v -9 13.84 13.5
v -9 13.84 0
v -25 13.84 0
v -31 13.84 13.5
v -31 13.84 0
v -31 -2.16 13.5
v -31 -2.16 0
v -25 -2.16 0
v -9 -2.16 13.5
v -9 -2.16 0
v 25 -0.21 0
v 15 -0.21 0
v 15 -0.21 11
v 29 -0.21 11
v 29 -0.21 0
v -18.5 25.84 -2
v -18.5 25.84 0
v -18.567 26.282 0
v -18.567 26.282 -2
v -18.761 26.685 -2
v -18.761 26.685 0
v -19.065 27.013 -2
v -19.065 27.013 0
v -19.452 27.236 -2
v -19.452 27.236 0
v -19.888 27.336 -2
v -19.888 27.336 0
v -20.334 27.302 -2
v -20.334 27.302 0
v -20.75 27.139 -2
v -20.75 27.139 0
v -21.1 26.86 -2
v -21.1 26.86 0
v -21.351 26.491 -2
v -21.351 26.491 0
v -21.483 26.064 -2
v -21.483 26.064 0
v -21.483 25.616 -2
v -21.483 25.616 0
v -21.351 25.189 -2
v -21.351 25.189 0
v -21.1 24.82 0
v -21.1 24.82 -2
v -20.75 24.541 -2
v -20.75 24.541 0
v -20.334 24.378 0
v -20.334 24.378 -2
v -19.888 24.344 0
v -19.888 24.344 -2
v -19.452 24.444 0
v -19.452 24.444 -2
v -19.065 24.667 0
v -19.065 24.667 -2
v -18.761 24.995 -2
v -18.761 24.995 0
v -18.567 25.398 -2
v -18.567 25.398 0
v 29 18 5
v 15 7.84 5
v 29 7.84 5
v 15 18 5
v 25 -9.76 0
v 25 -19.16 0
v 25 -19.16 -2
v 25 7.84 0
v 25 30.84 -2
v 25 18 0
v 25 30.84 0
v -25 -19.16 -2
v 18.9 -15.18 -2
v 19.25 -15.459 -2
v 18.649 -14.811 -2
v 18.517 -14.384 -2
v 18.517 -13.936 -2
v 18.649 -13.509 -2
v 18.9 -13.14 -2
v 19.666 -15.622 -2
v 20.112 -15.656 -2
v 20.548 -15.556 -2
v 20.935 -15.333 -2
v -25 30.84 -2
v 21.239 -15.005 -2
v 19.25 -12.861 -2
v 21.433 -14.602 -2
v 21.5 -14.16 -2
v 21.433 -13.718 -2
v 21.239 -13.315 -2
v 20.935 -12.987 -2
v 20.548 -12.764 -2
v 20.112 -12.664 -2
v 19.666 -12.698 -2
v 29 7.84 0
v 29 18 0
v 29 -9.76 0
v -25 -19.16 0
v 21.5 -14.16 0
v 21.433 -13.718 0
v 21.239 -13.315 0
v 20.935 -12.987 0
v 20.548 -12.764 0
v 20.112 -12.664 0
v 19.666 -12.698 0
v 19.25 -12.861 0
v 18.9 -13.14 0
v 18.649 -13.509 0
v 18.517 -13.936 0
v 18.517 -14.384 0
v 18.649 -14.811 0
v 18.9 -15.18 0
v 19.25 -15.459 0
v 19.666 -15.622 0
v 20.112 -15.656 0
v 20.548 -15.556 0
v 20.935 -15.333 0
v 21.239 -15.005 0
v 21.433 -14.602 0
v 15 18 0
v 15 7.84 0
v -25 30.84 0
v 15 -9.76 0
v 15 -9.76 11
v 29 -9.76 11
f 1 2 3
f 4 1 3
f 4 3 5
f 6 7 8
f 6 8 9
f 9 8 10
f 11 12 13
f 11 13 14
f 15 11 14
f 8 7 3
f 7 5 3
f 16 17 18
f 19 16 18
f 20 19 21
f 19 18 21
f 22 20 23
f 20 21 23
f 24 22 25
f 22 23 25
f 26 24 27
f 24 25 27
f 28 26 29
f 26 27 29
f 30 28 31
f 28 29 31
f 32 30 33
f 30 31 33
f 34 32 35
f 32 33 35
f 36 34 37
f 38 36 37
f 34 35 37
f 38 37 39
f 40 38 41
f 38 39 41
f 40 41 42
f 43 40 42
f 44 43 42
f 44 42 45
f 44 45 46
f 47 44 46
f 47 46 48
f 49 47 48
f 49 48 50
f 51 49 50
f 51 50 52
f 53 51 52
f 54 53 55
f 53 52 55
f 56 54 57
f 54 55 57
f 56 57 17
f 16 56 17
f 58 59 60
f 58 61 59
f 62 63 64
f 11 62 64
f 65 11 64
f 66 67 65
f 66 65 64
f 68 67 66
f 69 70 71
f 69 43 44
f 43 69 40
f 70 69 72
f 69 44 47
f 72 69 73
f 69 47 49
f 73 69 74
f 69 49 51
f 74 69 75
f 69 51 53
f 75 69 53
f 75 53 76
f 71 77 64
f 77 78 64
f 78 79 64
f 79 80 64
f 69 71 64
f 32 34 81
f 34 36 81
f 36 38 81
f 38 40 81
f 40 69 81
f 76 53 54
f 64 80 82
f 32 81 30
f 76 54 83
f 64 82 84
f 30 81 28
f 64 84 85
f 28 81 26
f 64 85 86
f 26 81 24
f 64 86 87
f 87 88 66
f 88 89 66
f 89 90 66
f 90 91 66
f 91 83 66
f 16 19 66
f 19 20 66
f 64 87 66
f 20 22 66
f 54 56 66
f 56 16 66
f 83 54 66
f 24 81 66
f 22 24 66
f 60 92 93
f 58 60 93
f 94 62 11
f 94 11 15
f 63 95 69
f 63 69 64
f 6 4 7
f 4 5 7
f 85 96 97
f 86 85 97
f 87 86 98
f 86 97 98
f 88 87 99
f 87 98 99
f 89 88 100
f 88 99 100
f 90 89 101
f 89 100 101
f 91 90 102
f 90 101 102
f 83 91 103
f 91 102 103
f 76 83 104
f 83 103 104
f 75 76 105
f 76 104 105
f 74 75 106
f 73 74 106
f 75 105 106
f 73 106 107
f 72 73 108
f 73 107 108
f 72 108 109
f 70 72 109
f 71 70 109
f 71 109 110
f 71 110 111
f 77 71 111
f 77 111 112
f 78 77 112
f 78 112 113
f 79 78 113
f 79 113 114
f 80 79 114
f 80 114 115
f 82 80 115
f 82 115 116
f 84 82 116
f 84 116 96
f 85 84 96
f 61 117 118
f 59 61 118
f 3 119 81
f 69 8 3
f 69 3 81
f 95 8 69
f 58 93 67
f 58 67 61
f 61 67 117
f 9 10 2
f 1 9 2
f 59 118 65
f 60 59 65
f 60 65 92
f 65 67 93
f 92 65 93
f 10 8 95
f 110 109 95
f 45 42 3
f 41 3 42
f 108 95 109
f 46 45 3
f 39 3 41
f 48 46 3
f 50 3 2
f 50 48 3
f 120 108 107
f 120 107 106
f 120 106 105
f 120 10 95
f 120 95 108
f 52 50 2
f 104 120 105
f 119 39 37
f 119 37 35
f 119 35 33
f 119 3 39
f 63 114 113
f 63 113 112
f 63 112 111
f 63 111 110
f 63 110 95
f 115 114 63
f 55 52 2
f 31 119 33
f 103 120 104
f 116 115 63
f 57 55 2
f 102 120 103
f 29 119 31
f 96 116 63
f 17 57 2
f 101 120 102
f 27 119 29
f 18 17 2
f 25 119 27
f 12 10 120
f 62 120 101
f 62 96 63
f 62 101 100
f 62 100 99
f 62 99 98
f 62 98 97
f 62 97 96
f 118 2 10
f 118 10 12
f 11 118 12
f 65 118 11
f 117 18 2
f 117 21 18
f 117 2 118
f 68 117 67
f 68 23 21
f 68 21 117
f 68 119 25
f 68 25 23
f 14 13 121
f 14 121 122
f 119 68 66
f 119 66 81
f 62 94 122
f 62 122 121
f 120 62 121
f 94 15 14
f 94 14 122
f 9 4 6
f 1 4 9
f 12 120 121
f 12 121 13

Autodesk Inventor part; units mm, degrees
ref_plane "YZ Plane" through (0, 0, 0) normal (1, 0, 0) x (0, 1, 0)
ref_plane "XZ Plane" through (0, 0, 0) normal (0, 1, 0) x (-1, 0, 0)
ref_plane "XY Plane" through (0, 0, 0) normal (0, 0, 1) x (1, 0, 0)
sketch "Platine" plane through (0, 0, 0) normal (0, 0, 1) x (1, 0, 0)
  line L0 (-25, -19.16) -> (25, -19.16)
  line L1 (25, -19.16) -> (25, 30.84)
  line L2 (25, 30.84) -> (-25, 30.84)
  line L3 (-25, 30.84) -> (-25, -19.16)
  line L4 (-25, -19.16) -> (25, 30.84)
  line L5 (25, -19.16) -> (-25, 30.84)
  line L6 (-31, -2.16) -> (-9, -2.16)
  line L7 (-9, -2.16) -> (-9, 13.84)
  line L8 (-9, 13.84) -> (-31, 13.84)
  line L9 (-31, 13.84) -> (-31, -2.16)
  line L10 (29, -9.76) -> (15, -9.76)
  line L11 (15, -9.76) -> (15, -0.21)
  line L12 (15, -0.21) -> (29, -0.21)
  line L13 (29, -0.21) -> (29, -9.76)
  line L14 (15, 7.84) -> (29, 7.84)
  line L15 (29, 7.84) -> (29, 18)
  line L16 (29, 18) -> (15, 18)
  line L17 (15, 18) -> (15, 7.84)
  circle A0 centre (-20, 25.84) radius 1.5
  circle A1 centre (20, -14.16) radius 1.5
  line L18 (-31, 32.4529) -> (-31, -19) construction
  line L19 (29, 40.2658) -> (29, -31.3692) construction
  line L20 (-20, 25.84) -> (20, 25.84) construction
  line L21 (20, 25.84) -> (20, -14.16) construction
  line L22 (20, -14.16) -> (-20, -14.16) construction
  line L23 (-20, -14.16) -> (-20, 25.84) construction
  circle A2 centre (20, 25.84) radius 1.5
  circle A3 centre (-20, -14.16) radius 1.5
  point P0 (0, 0)
  point P1 (0, 5.84)
  dimension "d0" = 50
  dimension "d1" = 50
  dimension "d2" = 22
  dimension "d3" = 16
  dimension "d4" = 17
  dimension "d6" = 14
  dimension "d7" = 9.55
  dimension "d8" = 9.4
  dimension "d10" = 10.16
  dimension "d11" = 14
  dimension "d12" = 27
  dimension "d14" = 3
  dimension "d15" = 5
  dimension "d16" = 5
  dimension "d17" = 5
  dimension "d18" = 5
  dimension "d19" = 18
  dimension "d127" = 6
  dimension "d128" = 4
  dimension "d129" = 25
extrude "Platinengeometrie" add sketch "Platine" against normal blind 2 contours L4 A3 L5 L11 L10 A1 L0 | L3 L6 L7 L8 L5 A0 L4 A3 | L5 A1 L10 L1 | L3 L8 L7 L6 | A3 L4 | L4 A3 | L10 L5 L11 L12 L1 | A1 L5 | L5 A1 | L12 L11 L5 L4 A2 L1 L16 L17 L14 | L10 L11 L5 | L2 L4 A2 L5 A0 | L14 L17 L16 L1 | A0 L5 | L5 A0 | A2 L4 | L4 A2
extrude "MEBP 8-8G" add sketch "Platine" along normal blind 13.5 contours L6 L9 L8 L3 | L3 L8 L7 L6
extrude "HEBW21" add sketch "Platine" along normal blind 11 contours L10 L5 L11 L12 L1 | L1 L12 L13 L10 | L10 L11 L5
extrude "PSS 254/4W" add sketch "Platine" along normal blind 5 contours L14 L17 L16 L1 | L1 L16 L15 L14
extrude "Extrusion9" cut sketch "Platine" against normal up to next contours A1 L5 | L5 A1 | A0 L5 | L5 A0
equation "\"d136\" = d18"
properties part number "PCB-Model"
